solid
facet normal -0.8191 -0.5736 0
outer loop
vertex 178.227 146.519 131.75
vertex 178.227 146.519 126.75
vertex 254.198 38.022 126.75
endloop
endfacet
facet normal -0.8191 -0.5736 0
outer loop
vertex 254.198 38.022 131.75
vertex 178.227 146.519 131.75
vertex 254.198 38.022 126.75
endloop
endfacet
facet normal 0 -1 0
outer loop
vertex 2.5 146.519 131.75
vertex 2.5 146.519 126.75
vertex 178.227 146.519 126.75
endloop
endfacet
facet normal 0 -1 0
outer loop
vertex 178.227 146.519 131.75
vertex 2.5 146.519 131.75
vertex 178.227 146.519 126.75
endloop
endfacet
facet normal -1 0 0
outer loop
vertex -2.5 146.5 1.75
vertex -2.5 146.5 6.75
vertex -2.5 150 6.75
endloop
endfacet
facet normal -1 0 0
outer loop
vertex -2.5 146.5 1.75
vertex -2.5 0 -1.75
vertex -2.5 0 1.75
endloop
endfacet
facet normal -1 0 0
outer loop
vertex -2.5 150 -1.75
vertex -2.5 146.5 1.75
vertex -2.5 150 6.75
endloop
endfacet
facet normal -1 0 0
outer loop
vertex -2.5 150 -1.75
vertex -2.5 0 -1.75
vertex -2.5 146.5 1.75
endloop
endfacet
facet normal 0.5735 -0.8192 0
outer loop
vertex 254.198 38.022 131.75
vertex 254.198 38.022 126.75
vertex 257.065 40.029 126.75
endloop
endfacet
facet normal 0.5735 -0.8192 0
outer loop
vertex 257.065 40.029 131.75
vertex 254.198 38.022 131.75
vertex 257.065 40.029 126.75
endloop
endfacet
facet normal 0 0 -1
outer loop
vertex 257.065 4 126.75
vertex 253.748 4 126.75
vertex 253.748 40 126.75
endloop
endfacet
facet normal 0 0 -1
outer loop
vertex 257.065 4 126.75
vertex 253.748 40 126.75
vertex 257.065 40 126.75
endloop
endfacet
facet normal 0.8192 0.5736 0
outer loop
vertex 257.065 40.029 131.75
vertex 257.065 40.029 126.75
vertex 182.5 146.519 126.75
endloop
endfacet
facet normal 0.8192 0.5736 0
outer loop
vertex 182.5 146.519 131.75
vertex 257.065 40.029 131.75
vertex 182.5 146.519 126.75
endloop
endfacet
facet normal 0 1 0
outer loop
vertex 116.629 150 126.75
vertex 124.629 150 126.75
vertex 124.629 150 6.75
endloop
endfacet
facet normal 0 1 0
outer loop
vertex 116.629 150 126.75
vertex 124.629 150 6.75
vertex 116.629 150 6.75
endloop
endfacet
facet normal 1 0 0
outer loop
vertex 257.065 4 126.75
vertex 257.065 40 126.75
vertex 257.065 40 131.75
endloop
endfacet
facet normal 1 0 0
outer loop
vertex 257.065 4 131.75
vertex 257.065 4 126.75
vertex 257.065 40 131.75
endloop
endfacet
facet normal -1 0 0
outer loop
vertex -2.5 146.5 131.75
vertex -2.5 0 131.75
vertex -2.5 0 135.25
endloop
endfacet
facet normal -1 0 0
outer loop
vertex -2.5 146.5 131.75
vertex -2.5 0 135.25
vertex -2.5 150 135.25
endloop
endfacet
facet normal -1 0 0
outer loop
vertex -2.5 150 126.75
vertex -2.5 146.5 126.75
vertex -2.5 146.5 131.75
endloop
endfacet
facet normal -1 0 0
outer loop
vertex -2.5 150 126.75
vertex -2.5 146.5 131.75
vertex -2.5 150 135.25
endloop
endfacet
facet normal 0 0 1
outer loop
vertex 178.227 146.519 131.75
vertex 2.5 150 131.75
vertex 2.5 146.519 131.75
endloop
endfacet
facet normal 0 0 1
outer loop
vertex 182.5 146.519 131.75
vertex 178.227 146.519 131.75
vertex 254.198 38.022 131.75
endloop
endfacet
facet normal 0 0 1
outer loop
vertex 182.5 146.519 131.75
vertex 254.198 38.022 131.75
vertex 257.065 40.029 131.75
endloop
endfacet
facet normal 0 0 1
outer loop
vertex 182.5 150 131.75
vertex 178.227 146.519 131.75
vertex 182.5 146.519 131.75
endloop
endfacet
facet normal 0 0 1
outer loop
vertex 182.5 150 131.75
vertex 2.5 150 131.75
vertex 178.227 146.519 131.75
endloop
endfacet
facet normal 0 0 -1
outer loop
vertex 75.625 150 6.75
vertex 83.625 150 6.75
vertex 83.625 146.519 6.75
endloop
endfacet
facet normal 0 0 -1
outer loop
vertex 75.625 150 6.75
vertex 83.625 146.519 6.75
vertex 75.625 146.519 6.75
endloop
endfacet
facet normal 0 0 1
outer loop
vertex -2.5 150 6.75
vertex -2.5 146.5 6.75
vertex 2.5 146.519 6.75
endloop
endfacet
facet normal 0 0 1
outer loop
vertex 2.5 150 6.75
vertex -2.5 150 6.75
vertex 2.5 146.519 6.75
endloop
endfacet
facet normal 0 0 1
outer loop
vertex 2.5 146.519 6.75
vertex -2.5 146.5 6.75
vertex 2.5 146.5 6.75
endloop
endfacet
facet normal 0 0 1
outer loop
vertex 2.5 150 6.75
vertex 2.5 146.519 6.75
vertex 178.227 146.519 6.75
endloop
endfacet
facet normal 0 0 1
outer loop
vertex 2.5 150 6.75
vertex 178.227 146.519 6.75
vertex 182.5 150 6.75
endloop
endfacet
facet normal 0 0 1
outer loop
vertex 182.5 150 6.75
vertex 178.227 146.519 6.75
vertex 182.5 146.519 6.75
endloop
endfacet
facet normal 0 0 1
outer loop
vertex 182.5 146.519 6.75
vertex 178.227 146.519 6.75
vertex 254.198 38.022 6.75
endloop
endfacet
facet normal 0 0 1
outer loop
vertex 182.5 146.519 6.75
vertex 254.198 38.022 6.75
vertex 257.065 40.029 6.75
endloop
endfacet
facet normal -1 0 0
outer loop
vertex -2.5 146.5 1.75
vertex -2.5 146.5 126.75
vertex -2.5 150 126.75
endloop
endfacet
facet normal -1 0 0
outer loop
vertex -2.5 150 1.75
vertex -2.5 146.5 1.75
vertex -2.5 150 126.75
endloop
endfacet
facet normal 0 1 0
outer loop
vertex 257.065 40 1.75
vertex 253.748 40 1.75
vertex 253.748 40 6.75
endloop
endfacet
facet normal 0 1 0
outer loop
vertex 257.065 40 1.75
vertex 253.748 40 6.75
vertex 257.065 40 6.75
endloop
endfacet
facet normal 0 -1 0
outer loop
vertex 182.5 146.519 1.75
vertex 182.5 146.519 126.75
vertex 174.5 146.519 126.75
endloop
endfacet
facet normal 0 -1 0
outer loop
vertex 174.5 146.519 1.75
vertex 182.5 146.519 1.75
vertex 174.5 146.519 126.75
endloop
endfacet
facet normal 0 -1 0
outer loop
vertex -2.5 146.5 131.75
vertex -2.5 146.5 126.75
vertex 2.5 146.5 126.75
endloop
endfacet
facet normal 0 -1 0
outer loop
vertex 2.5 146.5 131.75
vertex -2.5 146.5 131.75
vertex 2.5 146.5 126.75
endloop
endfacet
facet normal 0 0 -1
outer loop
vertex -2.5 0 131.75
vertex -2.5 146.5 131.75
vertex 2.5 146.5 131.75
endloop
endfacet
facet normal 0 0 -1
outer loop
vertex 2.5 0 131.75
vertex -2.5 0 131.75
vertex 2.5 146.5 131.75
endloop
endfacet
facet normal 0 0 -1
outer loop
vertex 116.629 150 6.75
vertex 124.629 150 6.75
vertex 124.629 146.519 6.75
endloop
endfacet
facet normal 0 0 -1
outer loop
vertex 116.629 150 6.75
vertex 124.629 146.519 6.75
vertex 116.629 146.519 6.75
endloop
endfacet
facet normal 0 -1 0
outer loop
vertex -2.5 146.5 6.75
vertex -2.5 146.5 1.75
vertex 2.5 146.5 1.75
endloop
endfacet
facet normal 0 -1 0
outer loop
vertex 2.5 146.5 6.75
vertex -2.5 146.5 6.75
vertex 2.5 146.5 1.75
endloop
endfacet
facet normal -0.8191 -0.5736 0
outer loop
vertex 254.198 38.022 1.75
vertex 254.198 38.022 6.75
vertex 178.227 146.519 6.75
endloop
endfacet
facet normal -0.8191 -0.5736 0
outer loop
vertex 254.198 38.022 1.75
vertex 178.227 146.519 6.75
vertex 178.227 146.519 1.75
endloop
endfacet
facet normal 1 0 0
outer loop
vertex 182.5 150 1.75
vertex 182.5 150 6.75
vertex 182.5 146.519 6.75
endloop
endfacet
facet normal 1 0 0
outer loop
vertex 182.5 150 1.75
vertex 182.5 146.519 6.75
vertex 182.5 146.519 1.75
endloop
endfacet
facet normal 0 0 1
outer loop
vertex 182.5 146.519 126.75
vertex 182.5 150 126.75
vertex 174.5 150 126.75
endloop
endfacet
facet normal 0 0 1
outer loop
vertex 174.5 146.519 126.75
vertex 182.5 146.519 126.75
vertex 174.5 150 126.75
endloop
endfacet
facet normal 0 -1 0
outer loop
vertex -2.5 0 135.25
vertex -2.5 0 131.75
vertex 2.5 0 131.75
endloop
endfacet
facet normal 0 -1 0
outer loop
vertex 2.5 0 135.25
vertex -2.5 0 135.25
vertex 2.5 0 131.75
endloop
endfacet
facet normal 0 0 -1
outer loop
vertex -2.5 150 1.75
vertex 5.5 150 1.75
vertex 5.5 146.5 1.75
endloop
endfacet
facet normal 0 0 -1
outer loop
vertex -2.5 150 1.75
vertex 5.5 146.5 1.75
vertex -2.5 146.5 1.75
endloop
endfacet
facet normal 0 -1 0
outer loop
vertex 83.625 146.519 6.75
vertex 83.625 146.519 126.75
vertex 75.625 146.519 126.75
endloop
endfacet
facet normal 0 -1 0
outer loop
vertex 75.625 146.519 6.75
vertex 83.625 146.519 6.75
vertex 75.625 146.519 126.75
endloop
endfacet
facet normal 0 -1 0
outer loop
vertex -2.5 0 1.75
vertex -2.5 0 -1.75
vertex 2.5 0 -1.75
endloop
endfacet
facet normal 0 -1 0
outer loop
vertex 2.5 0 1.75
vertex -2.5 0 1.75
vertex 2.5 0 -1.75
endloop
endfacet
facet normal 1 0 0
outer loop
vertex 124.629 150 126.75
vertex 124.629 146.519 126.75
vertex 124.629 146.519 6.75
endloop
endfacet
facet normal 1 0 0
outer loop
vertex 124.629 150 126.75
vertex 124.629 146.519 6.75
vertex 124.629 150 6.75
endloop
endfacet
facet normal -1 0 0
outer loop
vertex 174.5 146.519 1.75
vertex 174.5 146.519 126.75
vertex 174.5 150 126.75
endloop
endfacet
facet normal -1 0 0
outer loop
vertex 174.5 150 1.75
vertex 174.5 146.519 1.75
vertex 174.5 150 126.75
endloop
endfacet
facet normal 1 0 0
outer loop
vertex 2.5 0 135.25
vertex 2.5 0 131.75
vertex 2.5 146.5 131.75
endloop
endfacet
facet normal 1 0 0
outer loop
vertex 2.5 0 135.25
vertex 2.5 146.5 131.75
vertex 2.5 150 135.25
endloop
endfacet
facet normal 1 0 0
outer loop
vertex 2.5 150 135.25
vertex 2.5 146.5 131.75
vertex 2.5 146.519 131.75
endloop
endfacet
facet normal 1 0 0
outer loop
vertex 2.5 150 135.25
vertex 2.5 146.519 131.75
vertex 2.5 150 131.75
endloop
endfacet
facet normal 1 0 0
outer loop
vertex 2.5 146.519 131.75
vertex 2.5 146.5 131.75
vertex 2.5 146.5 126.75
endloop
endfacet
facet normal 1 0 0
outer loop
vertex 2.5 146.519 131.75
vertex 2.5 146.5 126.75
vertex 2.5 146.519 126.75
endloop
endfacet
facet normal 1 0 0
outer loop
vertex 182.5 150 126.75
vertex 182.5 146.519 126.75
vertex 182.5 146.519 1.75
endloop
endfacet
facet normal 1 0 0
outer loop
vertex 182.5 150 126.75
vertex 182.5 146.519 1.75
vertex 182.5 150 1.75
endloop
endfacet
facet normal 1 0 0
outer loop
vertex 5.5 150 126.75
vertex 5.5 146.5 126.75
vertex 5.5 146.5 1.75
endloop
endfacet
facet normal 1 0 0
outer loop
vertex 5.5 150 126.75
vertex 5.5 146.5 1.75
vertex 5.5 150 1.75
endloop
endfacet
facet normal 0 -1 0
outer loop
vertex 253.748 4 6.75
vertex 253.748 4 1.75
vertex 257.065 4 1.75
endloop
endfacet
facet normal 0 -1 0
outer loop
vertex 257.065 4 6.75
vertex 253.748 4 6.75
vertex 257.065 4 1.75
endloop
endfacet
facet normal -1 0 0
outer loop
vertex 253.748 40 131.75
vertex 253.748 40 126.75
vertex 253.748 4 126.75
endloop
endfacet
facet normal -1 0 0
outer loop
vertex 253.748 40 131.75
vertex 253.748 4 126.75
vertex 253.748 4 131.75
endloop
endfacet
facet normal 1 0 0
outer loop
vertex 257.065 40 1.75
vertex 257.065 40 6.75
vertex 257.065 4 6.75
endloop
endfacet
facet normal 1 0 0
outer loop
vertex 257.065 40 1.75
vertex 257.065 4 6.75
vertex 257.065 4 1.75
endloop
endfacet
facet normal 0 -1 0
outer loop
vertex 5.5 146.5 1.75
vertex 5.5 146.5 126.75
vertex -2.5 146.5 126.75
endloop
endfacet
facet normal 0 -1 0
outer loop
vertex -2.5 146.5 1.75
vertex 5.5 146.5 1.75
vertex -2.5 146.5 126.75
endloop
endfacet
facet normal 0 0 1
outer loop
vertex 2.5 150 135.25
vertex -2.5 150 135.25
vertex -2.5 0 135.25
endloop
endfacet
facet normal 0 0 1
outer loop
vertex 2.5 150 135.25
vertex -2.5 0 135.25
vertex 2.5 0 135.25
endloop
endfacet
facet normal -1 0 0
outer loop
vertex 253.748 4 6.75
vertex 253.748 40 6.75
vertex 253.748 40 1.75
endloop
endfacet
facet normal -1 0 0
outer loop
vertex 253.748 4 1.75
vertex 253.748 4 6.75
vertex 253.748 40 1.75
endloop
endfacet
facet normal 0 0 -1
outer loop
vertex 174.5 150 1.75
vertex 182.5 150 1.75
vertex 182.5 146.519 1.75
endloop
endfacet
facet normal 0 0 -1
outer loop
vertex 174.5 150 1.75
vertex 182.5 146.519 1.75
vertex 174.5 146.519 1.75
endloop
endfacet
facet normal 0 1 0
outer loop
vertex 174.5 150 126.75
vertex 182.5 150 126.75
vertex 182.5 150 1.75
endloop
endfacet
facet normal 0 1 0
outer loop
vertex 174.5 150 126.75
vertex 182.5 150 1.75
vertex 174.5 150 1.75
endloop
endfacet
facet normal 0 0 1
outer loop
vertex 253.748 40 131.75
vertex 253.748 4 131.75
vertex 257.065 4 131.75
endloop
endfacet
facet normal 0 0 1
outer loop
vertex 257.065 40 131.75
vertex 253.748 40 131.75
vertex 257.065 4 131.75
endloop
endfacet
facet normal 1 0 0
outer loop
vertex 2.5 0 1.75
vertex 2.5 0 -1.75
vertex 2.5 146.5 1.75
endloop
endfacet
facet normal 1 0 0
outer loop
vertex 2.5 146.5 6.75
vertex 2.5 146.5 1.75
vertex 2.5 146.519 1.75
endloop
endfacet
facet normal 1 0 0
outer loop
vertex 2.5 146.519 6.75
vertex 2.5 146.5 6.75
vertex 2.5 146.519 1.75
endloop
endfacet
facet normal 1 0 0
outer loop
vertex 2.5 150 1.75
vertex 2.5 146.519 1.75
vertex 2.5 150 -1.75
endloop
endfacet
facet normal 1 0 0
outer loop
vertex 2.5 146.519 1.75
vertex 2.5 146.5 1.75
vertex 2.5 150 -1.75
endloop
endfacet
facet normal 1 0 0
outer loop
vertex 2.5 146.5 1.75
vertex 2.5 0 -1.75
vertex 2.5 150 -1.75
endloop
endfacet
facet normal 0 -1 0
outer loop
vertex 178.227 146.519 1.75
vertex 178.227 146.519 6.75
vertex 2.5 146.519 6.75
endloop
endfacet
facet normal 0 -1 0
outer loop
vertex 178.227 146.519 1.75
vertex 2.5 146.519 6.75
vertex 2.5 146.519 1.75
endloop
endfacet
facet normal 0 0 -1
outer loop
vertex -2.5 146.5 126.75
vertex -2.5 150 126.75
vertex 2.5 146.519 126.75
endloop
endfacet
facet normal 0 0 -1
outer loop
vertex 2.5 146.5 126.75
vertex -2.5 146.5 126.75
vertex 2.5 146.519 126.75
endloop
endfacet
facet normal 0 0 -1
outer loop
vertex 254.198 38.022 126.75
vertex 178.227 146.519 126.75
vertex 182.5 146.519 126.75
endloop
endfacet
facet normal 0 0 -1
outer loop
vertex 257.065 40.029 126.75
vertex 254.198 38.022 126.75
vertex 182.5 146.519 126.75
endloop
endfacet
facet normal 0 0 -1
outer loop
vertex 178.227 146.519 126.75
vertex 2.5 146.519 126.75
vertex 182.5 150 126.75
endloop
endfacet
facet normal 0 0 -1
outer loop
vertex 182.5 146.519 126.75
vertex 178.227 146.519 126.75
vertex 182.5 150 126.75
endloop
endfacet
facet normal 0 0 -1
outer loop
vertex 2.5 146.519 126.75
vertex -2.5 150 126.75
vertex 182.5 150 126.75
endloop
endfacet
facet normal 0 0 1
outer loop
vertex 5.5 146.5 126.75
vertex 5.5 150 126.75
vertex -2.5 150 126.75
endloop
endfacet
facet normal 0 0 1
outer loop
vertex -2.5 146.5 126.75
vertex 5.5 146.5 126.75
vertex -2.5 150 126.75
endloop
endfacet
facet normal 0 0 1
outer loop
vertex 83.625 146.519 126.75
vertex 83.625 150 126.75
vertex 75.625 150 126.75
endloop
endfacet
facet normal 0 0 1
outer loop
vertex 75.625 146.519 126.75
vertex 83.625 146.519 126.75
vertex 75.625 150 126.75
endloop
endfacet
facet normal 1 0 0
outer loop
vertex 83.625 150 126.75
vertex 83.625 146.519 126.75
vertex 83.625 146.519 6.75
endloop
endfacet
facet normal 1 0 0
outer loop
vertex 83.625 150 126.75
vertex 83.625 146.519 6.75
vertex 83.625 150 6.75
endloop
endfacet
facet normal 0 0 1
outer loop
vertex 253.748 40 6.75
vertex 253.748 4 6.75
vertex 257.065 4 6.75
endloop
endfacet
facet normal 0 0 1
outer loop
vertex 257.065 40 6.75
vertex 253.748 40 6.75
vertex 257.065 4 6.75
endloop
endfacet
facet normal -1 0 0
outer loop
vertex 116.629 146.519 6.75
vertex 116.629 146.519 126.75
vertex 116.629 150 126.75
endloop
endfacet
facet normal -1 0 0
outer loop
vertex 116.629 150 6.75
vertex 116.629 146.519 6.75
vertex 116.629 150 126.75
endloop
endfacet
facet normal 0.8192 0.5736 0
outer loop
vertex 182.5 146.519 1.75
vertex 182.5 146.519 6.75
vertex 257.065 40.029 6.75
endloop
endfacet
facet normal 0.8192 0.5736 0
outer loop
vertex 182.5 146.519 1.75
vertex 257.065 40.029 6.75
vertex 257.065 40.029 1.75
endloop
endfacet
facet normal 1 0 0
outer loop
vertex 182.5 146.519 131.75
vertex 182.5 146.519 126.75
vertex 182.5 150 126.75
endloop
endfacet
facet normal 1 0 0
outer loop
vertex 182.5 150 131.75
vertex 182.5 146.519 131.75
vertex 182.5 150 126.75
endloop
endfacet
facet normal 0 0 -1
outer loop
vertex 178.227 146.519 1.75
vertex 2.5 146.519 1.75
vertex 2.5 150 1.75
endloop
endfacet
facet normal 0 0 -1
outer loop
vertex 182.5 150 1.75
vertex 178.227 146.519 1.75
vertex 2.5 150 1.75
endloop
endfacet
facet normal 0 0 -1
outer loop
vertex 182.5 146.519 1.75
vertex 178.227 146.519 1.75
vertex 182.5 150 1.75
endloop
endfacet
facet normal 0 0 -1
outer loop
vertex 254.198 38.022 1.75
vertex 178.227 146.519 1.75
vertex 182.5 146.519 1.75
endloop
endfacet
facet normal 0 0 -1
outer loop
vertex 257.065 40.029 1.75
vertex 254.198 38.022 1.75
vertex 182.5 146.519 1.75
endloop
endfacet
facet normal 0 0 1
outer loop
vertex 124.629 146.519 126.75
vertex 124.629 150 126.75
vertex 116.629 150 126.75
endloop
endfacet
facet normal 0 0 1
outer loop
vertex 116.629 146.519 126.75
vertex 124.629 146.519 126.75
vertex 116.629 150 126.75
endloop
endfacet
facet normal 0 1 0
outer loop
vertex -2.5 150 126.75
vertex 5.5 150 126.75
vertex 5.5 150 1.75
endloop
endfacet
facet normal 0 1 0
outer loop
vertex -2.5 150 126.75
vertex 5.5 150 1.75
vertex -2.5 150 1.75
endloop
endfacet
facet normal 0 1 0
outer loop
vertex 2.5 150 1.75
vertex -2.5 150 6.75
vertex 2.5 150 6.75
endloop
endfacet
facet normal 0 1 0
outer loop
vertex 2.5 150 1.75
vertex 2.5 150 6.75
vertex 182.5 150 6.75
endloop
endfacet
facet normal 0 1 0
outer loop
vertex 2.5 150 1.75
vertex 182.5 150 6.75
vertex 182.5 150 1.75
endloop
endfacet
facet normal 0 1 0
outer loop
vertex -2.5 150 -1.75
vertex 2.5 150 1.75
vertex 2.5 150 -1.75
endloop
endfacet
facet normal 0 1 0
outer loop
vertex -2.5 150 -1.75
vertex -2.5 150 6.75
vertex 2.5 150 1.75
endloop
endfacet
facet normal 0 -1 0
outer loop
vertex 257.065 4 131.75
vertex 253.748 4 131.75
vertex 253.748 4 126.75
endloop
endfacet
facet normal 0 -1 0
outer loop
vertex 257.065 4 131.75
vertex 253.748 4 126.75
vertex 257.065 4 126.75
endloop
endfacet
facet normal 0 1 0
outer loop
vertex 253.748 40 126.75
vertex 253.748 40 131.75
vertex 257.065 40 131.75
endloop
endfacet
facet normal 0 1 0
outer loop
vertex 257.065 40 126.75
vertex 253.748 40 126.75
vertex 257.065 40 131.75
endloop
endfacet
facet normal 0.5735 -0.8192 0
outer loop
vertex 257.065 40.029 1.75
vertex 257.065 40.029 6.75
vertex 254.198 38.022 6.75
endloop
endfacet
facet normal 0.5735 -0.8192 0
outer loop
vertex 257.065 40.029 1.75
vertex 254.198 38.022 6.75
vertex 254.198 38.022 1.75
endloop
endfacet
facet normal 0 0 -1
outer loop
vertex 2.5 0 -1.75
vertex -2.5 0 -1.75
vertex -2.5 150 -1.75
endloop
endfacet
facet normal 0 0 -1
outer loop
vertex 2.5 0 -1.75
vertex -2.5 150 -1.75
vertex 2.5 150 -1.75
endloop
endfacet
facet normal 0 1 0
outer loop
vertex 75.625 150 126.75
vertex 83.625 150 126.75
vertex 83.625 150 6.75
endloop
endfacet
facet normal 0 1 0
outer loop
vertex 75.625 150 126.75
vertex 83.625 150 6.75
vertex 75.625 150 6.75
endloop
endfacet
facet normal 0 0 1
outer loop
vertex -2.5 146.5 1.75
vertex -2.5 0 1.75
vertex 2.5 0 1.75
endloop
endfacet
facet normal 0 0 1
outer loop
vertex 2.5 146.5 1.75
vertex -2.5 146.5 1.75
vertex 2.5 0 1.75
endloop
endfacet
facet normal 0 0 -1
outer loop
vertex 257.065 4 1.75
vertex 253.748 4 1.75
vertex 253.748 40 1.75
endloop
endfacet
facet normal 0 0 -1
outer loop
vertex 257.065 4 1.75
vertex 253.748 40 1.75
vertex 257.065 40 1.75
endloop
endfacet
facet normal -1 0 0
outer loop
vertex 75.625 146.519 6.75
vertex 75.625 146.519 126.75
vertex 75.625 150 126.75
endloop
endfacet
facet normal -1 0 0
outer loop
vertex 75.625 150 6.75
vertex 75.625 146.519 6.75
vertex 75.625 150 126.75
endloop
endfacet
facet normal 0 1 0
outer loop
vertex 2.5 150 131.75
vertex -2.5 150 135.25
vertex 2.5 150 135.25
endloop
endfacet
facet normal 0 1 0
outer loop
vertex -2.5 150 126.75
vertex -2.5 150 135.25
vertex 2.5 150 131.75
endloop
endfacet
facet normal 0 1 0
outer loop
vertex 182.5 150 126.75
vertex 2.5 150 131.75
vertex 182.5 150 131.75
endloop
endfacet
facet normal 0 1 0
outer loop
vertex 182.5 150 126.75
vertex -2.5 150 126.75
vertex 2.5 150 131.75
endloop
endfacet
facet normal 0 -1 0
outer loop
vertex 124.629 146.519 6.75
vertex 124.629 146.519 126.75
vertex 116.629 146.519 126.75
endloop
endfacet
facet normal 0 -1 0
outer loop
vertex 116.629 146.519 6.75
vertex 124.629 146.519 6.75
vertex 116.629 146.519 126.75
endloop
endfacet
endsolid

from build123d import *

# Parameters (mm, degrees)
SKETCH2_W                       = 5
SKETCH2_H                       = 3.5
BOSS_EXTRUDE1_DEPTH             = 150
SKETCH5_W                       = 5
SKETCH5_H                       = 3.5
BOSS_EXTRUDE2_DEPTH             = 5
SKETCH7_W                       = 5
SKETCH7_H                       = 3.481165415
BOSS_EXTRUDE3_DEPTH             = 180
SKETCH11_W                      = 5
SKETCH11_H                      = 3.5
BOSS_EXTRUDE4_DEPTH             = 130
BOSS_EXTRUDE4_DIRECTION_2_REACH = 237.646
BOSS_EXTRUDE14_DEPTH            = 6
BOSS_EXTRUDE14_DEPTH_BACK       = 30
SKETCH23_W                      = 3.317254227
SKETCH23_H                      = 5
MIRROR7_START                   = 126.75
MIRROR7_DEPTH                   = 5
MIRROR7_START_2                 = 131.75
MIRROR7_2_OUTLINE_W             = 5
MIRROR7_2_OUTLINE_H             = 150
MIRROR7_2_DEPTH                 = 3.5
SKETCH26_W                      = 8
SKETCH26_H                      = 3.481165415
BOSS_EXTRUDE16_DEPTH            = 125
SKETCH30_W                      = 8
SKETCH30_H                      = 3.481165415
BOSS_EXTRUDE22_DEPTH            = 120
SKETCH31_W                      = 8
SKETCH31_H                      = 3.481165415
BOSS_EXTRUDE23_DEPTH            = 120
SKETCH29_W                      = 8
SKETCH29_H                      = 3.5
BOSS_EXTRUDE26_DEPTH            = 125


# Read off the part's stored shape, not the designer's step: Mirror7
with BuildPart() as part:
    # Sketch2 → Boss-Extrude1 (new body)
    with BuildSketch(Plane(origin=(0, 0, 0), x_dir=(1, 0, 0), z_dir=(0, 1, 0))):
        Rectangle(SKETCH2_W, SKETCH2_H)
    extrude(amount=BOSS_EXTRUDE1_DEPTH)

    # Sketch5 → Boss-Extrude2 (add)
    with BuildSketch(Plane.XY.offset(1.75)):
        with Locations((0, 148.25)):
            Rectangle(SKETCH5_W, SKETCH5_H)
    extrude(amount=BOSS_EXTRUDE2_DEPTH)

    # Sketch7 → Boss-Extrude3 (add)
    with BuildSketch(Plane(origin=(2.5, 0, 0), x_dir=(0, 0, -1), z_dir=(1, 0, 0))):
        with Locations((-4.25, 148.259417293)):
            Rectangle(SKETCH7_W, SKETCH7_H)
    extrude(amount=BOSS_EXTRUDE3_DEPTH)

    # Sketch11 → Boss-Extrude4 (add)
    with BuildSketch(Plane(origin=(-8.800671911, 12.568662048, 0), x_dir=(0, 0, -1), z_dir=(0.5735764363510444, -0.819152044288993, 0))):
        with Locations((-4.25, 231.784999082)):
            Rectangle(SKETCH11_W, SKETCH11_H)
    extrude(amount=BOSS_EXTRUDE4_DEPTH)

    # Boss-Extrude4 direction 2: up to this face of the body (flat: up to its plane)
    boss_extrude4_direction_2_end = Plane(part.part.faces().sort_by_distance((88.328912467, 150, 4.171087533))[0])
    # Sketch11 → Boss-Extrude4 direction 2 (add, up to the picked face)
    with BuildSketch(Plane(origin=(-8.800671911, 12.568662048, 0), x_dir=(0, 0, -1), z_dir=(0.5735764363510444, -0.819152044288993, 0)), mode=Mode.PRIVATE) as boss_extrude4_direction_2_sk1:
        with Locations((-4.25, 231.784999082)):
            Rectangle(SKETCH11_W, SKETCH11_H)
    boss_extrude4_direction_2_tool1 = split(extrude(boss_extrude4_direction_2_sk1.sketch, amount=-BOSS_EXTRUDE4_DIRECTION_2_REACH, mode=Mode.PRIVATE), bisect_by=boss_extrude4_direction_2_end, keep=Keep.BOTH, mode=Mode.PRIVATE)
    add(boss_extrude4_direction_2_tool1.solids().sort_by(Axis((181.066484, 145.515076, 4.25), (-0.5735764363510444, 0.819152044288993, 0)))[0])


with BuildPart() as body_2:
    # Sketch23 → Boss-Extrude14 (new, two sides: drawn at the far end of the back side and taken through both)
    with BuildSketch(Plane(origin=(0, 34, 0), x_dir=(1, 0, 0), z_dir=(0, 1, 0)).offset(-BOSS_EXTRUDE14_DEPTH_BACK)):
        with Locations((255.406309613, -4.25)):
            Rectangle(SKETCH23_W, SKETCH23_H)
    extrude(amount=BOSS_EXTRUDE14_DEPTH + BOSS_EXTRUDE14_DEPTH_BACK)


with BuildPart() as body_3:
    # Mirror7 outline → Mirror7 (new body)
    with BuildSketch(Plane.XY.offset(MIRROR7_START)):
        Polygon((182.5, 150), (-2.5, 150), (-2.5, 146.5), (2.5, 146.5), (2.5, 146.518834585), (178.227288939, 146.518834585), (254.197904571, 38.0215513), (257.064936726, 40.029068827), (182.5, 146.518834585), align=None)
    extrude(amount=MIRROR7_DEPTH)

    # Mirror7 2 outline → Mirror7 2 (add)
    with BuildSketch(Plane.XY.offset(MIRROR7_START_2)):
        with Locations((0, 75)):
            Rectangle(MIRROR7_2_OUTLINE_W, MIRROR7_2_OUTLINE_H)
    extrude(amount=MIRROR7_2_DEPTH)


with BuildPart() as body_4:
    # Sketch26 → Boss-Extrude16 (new body)
    with BuildSketch(Plane(origin=(0, 0, 126.75), x_dir=(-1, 0, 0), z_dir=(0, 0, -1))):
        with Locations((-178.5, 148.259417293)):
            Rectangle(SKETCH26_W, SKETCH26_H)
    extrude(amount=BOSS_EXTRUDE16_DEPTH)


with BuildPart() as body_5:
    # Sketch30 → Boss-Extrude22 (new body)
    with BuildSketch(Plane(origin=(0, 0, 126.75), x_dir=(-1, 0, 0), z_dir=(0, 0, -1))):
        with Locations((-120.62899812, 148.259417293)):
            Rectangle(SKETCH30_W, SKETCH30_H)
    extrude(amount=BOSS_EXTRUDE22_DEPTH)


with BuildPart() as body_6:
    # Sketch31 → Boss-Extrude23 (new body)
    with BuildSketch(Plane(origin=(0, 0, 126.75), x_dir=(-1, 0, 0), z_dir=(0, 0, -1))):
        with Locations((-79.625299037, 148.259417293)):
            Rectangle(SKETCH31_W, SKETCH31_H)
    extrude(amount=BOSS_EXTRUDE23_DEPTH)


with BuildPart() as body_7:
    # Sketch29 → Boss-Extrude26 (new body)
    with BuildSketch(Plane(origin=(0, 0, 126.75), x_dir=(-1, 0, 0), z_dir=(0, 0, -1))):
        with Locations((-1.5, 148.25)):
            Rectangle(SKETCH29_W, SKETCH29_H)
    extrude(amount=BOSS_EXTRUDE26_DEPTH)


with BuildPart() as body_8:
    # Mirror8: mirrored copy
    add(body_2.part.mirror(Plane.XY.offset(66.75)))


solid = Compound([part.part, body_2.part, body_3.part, body_4.part, body_5.part, body_6.part, body_7.part, body_8.part])
